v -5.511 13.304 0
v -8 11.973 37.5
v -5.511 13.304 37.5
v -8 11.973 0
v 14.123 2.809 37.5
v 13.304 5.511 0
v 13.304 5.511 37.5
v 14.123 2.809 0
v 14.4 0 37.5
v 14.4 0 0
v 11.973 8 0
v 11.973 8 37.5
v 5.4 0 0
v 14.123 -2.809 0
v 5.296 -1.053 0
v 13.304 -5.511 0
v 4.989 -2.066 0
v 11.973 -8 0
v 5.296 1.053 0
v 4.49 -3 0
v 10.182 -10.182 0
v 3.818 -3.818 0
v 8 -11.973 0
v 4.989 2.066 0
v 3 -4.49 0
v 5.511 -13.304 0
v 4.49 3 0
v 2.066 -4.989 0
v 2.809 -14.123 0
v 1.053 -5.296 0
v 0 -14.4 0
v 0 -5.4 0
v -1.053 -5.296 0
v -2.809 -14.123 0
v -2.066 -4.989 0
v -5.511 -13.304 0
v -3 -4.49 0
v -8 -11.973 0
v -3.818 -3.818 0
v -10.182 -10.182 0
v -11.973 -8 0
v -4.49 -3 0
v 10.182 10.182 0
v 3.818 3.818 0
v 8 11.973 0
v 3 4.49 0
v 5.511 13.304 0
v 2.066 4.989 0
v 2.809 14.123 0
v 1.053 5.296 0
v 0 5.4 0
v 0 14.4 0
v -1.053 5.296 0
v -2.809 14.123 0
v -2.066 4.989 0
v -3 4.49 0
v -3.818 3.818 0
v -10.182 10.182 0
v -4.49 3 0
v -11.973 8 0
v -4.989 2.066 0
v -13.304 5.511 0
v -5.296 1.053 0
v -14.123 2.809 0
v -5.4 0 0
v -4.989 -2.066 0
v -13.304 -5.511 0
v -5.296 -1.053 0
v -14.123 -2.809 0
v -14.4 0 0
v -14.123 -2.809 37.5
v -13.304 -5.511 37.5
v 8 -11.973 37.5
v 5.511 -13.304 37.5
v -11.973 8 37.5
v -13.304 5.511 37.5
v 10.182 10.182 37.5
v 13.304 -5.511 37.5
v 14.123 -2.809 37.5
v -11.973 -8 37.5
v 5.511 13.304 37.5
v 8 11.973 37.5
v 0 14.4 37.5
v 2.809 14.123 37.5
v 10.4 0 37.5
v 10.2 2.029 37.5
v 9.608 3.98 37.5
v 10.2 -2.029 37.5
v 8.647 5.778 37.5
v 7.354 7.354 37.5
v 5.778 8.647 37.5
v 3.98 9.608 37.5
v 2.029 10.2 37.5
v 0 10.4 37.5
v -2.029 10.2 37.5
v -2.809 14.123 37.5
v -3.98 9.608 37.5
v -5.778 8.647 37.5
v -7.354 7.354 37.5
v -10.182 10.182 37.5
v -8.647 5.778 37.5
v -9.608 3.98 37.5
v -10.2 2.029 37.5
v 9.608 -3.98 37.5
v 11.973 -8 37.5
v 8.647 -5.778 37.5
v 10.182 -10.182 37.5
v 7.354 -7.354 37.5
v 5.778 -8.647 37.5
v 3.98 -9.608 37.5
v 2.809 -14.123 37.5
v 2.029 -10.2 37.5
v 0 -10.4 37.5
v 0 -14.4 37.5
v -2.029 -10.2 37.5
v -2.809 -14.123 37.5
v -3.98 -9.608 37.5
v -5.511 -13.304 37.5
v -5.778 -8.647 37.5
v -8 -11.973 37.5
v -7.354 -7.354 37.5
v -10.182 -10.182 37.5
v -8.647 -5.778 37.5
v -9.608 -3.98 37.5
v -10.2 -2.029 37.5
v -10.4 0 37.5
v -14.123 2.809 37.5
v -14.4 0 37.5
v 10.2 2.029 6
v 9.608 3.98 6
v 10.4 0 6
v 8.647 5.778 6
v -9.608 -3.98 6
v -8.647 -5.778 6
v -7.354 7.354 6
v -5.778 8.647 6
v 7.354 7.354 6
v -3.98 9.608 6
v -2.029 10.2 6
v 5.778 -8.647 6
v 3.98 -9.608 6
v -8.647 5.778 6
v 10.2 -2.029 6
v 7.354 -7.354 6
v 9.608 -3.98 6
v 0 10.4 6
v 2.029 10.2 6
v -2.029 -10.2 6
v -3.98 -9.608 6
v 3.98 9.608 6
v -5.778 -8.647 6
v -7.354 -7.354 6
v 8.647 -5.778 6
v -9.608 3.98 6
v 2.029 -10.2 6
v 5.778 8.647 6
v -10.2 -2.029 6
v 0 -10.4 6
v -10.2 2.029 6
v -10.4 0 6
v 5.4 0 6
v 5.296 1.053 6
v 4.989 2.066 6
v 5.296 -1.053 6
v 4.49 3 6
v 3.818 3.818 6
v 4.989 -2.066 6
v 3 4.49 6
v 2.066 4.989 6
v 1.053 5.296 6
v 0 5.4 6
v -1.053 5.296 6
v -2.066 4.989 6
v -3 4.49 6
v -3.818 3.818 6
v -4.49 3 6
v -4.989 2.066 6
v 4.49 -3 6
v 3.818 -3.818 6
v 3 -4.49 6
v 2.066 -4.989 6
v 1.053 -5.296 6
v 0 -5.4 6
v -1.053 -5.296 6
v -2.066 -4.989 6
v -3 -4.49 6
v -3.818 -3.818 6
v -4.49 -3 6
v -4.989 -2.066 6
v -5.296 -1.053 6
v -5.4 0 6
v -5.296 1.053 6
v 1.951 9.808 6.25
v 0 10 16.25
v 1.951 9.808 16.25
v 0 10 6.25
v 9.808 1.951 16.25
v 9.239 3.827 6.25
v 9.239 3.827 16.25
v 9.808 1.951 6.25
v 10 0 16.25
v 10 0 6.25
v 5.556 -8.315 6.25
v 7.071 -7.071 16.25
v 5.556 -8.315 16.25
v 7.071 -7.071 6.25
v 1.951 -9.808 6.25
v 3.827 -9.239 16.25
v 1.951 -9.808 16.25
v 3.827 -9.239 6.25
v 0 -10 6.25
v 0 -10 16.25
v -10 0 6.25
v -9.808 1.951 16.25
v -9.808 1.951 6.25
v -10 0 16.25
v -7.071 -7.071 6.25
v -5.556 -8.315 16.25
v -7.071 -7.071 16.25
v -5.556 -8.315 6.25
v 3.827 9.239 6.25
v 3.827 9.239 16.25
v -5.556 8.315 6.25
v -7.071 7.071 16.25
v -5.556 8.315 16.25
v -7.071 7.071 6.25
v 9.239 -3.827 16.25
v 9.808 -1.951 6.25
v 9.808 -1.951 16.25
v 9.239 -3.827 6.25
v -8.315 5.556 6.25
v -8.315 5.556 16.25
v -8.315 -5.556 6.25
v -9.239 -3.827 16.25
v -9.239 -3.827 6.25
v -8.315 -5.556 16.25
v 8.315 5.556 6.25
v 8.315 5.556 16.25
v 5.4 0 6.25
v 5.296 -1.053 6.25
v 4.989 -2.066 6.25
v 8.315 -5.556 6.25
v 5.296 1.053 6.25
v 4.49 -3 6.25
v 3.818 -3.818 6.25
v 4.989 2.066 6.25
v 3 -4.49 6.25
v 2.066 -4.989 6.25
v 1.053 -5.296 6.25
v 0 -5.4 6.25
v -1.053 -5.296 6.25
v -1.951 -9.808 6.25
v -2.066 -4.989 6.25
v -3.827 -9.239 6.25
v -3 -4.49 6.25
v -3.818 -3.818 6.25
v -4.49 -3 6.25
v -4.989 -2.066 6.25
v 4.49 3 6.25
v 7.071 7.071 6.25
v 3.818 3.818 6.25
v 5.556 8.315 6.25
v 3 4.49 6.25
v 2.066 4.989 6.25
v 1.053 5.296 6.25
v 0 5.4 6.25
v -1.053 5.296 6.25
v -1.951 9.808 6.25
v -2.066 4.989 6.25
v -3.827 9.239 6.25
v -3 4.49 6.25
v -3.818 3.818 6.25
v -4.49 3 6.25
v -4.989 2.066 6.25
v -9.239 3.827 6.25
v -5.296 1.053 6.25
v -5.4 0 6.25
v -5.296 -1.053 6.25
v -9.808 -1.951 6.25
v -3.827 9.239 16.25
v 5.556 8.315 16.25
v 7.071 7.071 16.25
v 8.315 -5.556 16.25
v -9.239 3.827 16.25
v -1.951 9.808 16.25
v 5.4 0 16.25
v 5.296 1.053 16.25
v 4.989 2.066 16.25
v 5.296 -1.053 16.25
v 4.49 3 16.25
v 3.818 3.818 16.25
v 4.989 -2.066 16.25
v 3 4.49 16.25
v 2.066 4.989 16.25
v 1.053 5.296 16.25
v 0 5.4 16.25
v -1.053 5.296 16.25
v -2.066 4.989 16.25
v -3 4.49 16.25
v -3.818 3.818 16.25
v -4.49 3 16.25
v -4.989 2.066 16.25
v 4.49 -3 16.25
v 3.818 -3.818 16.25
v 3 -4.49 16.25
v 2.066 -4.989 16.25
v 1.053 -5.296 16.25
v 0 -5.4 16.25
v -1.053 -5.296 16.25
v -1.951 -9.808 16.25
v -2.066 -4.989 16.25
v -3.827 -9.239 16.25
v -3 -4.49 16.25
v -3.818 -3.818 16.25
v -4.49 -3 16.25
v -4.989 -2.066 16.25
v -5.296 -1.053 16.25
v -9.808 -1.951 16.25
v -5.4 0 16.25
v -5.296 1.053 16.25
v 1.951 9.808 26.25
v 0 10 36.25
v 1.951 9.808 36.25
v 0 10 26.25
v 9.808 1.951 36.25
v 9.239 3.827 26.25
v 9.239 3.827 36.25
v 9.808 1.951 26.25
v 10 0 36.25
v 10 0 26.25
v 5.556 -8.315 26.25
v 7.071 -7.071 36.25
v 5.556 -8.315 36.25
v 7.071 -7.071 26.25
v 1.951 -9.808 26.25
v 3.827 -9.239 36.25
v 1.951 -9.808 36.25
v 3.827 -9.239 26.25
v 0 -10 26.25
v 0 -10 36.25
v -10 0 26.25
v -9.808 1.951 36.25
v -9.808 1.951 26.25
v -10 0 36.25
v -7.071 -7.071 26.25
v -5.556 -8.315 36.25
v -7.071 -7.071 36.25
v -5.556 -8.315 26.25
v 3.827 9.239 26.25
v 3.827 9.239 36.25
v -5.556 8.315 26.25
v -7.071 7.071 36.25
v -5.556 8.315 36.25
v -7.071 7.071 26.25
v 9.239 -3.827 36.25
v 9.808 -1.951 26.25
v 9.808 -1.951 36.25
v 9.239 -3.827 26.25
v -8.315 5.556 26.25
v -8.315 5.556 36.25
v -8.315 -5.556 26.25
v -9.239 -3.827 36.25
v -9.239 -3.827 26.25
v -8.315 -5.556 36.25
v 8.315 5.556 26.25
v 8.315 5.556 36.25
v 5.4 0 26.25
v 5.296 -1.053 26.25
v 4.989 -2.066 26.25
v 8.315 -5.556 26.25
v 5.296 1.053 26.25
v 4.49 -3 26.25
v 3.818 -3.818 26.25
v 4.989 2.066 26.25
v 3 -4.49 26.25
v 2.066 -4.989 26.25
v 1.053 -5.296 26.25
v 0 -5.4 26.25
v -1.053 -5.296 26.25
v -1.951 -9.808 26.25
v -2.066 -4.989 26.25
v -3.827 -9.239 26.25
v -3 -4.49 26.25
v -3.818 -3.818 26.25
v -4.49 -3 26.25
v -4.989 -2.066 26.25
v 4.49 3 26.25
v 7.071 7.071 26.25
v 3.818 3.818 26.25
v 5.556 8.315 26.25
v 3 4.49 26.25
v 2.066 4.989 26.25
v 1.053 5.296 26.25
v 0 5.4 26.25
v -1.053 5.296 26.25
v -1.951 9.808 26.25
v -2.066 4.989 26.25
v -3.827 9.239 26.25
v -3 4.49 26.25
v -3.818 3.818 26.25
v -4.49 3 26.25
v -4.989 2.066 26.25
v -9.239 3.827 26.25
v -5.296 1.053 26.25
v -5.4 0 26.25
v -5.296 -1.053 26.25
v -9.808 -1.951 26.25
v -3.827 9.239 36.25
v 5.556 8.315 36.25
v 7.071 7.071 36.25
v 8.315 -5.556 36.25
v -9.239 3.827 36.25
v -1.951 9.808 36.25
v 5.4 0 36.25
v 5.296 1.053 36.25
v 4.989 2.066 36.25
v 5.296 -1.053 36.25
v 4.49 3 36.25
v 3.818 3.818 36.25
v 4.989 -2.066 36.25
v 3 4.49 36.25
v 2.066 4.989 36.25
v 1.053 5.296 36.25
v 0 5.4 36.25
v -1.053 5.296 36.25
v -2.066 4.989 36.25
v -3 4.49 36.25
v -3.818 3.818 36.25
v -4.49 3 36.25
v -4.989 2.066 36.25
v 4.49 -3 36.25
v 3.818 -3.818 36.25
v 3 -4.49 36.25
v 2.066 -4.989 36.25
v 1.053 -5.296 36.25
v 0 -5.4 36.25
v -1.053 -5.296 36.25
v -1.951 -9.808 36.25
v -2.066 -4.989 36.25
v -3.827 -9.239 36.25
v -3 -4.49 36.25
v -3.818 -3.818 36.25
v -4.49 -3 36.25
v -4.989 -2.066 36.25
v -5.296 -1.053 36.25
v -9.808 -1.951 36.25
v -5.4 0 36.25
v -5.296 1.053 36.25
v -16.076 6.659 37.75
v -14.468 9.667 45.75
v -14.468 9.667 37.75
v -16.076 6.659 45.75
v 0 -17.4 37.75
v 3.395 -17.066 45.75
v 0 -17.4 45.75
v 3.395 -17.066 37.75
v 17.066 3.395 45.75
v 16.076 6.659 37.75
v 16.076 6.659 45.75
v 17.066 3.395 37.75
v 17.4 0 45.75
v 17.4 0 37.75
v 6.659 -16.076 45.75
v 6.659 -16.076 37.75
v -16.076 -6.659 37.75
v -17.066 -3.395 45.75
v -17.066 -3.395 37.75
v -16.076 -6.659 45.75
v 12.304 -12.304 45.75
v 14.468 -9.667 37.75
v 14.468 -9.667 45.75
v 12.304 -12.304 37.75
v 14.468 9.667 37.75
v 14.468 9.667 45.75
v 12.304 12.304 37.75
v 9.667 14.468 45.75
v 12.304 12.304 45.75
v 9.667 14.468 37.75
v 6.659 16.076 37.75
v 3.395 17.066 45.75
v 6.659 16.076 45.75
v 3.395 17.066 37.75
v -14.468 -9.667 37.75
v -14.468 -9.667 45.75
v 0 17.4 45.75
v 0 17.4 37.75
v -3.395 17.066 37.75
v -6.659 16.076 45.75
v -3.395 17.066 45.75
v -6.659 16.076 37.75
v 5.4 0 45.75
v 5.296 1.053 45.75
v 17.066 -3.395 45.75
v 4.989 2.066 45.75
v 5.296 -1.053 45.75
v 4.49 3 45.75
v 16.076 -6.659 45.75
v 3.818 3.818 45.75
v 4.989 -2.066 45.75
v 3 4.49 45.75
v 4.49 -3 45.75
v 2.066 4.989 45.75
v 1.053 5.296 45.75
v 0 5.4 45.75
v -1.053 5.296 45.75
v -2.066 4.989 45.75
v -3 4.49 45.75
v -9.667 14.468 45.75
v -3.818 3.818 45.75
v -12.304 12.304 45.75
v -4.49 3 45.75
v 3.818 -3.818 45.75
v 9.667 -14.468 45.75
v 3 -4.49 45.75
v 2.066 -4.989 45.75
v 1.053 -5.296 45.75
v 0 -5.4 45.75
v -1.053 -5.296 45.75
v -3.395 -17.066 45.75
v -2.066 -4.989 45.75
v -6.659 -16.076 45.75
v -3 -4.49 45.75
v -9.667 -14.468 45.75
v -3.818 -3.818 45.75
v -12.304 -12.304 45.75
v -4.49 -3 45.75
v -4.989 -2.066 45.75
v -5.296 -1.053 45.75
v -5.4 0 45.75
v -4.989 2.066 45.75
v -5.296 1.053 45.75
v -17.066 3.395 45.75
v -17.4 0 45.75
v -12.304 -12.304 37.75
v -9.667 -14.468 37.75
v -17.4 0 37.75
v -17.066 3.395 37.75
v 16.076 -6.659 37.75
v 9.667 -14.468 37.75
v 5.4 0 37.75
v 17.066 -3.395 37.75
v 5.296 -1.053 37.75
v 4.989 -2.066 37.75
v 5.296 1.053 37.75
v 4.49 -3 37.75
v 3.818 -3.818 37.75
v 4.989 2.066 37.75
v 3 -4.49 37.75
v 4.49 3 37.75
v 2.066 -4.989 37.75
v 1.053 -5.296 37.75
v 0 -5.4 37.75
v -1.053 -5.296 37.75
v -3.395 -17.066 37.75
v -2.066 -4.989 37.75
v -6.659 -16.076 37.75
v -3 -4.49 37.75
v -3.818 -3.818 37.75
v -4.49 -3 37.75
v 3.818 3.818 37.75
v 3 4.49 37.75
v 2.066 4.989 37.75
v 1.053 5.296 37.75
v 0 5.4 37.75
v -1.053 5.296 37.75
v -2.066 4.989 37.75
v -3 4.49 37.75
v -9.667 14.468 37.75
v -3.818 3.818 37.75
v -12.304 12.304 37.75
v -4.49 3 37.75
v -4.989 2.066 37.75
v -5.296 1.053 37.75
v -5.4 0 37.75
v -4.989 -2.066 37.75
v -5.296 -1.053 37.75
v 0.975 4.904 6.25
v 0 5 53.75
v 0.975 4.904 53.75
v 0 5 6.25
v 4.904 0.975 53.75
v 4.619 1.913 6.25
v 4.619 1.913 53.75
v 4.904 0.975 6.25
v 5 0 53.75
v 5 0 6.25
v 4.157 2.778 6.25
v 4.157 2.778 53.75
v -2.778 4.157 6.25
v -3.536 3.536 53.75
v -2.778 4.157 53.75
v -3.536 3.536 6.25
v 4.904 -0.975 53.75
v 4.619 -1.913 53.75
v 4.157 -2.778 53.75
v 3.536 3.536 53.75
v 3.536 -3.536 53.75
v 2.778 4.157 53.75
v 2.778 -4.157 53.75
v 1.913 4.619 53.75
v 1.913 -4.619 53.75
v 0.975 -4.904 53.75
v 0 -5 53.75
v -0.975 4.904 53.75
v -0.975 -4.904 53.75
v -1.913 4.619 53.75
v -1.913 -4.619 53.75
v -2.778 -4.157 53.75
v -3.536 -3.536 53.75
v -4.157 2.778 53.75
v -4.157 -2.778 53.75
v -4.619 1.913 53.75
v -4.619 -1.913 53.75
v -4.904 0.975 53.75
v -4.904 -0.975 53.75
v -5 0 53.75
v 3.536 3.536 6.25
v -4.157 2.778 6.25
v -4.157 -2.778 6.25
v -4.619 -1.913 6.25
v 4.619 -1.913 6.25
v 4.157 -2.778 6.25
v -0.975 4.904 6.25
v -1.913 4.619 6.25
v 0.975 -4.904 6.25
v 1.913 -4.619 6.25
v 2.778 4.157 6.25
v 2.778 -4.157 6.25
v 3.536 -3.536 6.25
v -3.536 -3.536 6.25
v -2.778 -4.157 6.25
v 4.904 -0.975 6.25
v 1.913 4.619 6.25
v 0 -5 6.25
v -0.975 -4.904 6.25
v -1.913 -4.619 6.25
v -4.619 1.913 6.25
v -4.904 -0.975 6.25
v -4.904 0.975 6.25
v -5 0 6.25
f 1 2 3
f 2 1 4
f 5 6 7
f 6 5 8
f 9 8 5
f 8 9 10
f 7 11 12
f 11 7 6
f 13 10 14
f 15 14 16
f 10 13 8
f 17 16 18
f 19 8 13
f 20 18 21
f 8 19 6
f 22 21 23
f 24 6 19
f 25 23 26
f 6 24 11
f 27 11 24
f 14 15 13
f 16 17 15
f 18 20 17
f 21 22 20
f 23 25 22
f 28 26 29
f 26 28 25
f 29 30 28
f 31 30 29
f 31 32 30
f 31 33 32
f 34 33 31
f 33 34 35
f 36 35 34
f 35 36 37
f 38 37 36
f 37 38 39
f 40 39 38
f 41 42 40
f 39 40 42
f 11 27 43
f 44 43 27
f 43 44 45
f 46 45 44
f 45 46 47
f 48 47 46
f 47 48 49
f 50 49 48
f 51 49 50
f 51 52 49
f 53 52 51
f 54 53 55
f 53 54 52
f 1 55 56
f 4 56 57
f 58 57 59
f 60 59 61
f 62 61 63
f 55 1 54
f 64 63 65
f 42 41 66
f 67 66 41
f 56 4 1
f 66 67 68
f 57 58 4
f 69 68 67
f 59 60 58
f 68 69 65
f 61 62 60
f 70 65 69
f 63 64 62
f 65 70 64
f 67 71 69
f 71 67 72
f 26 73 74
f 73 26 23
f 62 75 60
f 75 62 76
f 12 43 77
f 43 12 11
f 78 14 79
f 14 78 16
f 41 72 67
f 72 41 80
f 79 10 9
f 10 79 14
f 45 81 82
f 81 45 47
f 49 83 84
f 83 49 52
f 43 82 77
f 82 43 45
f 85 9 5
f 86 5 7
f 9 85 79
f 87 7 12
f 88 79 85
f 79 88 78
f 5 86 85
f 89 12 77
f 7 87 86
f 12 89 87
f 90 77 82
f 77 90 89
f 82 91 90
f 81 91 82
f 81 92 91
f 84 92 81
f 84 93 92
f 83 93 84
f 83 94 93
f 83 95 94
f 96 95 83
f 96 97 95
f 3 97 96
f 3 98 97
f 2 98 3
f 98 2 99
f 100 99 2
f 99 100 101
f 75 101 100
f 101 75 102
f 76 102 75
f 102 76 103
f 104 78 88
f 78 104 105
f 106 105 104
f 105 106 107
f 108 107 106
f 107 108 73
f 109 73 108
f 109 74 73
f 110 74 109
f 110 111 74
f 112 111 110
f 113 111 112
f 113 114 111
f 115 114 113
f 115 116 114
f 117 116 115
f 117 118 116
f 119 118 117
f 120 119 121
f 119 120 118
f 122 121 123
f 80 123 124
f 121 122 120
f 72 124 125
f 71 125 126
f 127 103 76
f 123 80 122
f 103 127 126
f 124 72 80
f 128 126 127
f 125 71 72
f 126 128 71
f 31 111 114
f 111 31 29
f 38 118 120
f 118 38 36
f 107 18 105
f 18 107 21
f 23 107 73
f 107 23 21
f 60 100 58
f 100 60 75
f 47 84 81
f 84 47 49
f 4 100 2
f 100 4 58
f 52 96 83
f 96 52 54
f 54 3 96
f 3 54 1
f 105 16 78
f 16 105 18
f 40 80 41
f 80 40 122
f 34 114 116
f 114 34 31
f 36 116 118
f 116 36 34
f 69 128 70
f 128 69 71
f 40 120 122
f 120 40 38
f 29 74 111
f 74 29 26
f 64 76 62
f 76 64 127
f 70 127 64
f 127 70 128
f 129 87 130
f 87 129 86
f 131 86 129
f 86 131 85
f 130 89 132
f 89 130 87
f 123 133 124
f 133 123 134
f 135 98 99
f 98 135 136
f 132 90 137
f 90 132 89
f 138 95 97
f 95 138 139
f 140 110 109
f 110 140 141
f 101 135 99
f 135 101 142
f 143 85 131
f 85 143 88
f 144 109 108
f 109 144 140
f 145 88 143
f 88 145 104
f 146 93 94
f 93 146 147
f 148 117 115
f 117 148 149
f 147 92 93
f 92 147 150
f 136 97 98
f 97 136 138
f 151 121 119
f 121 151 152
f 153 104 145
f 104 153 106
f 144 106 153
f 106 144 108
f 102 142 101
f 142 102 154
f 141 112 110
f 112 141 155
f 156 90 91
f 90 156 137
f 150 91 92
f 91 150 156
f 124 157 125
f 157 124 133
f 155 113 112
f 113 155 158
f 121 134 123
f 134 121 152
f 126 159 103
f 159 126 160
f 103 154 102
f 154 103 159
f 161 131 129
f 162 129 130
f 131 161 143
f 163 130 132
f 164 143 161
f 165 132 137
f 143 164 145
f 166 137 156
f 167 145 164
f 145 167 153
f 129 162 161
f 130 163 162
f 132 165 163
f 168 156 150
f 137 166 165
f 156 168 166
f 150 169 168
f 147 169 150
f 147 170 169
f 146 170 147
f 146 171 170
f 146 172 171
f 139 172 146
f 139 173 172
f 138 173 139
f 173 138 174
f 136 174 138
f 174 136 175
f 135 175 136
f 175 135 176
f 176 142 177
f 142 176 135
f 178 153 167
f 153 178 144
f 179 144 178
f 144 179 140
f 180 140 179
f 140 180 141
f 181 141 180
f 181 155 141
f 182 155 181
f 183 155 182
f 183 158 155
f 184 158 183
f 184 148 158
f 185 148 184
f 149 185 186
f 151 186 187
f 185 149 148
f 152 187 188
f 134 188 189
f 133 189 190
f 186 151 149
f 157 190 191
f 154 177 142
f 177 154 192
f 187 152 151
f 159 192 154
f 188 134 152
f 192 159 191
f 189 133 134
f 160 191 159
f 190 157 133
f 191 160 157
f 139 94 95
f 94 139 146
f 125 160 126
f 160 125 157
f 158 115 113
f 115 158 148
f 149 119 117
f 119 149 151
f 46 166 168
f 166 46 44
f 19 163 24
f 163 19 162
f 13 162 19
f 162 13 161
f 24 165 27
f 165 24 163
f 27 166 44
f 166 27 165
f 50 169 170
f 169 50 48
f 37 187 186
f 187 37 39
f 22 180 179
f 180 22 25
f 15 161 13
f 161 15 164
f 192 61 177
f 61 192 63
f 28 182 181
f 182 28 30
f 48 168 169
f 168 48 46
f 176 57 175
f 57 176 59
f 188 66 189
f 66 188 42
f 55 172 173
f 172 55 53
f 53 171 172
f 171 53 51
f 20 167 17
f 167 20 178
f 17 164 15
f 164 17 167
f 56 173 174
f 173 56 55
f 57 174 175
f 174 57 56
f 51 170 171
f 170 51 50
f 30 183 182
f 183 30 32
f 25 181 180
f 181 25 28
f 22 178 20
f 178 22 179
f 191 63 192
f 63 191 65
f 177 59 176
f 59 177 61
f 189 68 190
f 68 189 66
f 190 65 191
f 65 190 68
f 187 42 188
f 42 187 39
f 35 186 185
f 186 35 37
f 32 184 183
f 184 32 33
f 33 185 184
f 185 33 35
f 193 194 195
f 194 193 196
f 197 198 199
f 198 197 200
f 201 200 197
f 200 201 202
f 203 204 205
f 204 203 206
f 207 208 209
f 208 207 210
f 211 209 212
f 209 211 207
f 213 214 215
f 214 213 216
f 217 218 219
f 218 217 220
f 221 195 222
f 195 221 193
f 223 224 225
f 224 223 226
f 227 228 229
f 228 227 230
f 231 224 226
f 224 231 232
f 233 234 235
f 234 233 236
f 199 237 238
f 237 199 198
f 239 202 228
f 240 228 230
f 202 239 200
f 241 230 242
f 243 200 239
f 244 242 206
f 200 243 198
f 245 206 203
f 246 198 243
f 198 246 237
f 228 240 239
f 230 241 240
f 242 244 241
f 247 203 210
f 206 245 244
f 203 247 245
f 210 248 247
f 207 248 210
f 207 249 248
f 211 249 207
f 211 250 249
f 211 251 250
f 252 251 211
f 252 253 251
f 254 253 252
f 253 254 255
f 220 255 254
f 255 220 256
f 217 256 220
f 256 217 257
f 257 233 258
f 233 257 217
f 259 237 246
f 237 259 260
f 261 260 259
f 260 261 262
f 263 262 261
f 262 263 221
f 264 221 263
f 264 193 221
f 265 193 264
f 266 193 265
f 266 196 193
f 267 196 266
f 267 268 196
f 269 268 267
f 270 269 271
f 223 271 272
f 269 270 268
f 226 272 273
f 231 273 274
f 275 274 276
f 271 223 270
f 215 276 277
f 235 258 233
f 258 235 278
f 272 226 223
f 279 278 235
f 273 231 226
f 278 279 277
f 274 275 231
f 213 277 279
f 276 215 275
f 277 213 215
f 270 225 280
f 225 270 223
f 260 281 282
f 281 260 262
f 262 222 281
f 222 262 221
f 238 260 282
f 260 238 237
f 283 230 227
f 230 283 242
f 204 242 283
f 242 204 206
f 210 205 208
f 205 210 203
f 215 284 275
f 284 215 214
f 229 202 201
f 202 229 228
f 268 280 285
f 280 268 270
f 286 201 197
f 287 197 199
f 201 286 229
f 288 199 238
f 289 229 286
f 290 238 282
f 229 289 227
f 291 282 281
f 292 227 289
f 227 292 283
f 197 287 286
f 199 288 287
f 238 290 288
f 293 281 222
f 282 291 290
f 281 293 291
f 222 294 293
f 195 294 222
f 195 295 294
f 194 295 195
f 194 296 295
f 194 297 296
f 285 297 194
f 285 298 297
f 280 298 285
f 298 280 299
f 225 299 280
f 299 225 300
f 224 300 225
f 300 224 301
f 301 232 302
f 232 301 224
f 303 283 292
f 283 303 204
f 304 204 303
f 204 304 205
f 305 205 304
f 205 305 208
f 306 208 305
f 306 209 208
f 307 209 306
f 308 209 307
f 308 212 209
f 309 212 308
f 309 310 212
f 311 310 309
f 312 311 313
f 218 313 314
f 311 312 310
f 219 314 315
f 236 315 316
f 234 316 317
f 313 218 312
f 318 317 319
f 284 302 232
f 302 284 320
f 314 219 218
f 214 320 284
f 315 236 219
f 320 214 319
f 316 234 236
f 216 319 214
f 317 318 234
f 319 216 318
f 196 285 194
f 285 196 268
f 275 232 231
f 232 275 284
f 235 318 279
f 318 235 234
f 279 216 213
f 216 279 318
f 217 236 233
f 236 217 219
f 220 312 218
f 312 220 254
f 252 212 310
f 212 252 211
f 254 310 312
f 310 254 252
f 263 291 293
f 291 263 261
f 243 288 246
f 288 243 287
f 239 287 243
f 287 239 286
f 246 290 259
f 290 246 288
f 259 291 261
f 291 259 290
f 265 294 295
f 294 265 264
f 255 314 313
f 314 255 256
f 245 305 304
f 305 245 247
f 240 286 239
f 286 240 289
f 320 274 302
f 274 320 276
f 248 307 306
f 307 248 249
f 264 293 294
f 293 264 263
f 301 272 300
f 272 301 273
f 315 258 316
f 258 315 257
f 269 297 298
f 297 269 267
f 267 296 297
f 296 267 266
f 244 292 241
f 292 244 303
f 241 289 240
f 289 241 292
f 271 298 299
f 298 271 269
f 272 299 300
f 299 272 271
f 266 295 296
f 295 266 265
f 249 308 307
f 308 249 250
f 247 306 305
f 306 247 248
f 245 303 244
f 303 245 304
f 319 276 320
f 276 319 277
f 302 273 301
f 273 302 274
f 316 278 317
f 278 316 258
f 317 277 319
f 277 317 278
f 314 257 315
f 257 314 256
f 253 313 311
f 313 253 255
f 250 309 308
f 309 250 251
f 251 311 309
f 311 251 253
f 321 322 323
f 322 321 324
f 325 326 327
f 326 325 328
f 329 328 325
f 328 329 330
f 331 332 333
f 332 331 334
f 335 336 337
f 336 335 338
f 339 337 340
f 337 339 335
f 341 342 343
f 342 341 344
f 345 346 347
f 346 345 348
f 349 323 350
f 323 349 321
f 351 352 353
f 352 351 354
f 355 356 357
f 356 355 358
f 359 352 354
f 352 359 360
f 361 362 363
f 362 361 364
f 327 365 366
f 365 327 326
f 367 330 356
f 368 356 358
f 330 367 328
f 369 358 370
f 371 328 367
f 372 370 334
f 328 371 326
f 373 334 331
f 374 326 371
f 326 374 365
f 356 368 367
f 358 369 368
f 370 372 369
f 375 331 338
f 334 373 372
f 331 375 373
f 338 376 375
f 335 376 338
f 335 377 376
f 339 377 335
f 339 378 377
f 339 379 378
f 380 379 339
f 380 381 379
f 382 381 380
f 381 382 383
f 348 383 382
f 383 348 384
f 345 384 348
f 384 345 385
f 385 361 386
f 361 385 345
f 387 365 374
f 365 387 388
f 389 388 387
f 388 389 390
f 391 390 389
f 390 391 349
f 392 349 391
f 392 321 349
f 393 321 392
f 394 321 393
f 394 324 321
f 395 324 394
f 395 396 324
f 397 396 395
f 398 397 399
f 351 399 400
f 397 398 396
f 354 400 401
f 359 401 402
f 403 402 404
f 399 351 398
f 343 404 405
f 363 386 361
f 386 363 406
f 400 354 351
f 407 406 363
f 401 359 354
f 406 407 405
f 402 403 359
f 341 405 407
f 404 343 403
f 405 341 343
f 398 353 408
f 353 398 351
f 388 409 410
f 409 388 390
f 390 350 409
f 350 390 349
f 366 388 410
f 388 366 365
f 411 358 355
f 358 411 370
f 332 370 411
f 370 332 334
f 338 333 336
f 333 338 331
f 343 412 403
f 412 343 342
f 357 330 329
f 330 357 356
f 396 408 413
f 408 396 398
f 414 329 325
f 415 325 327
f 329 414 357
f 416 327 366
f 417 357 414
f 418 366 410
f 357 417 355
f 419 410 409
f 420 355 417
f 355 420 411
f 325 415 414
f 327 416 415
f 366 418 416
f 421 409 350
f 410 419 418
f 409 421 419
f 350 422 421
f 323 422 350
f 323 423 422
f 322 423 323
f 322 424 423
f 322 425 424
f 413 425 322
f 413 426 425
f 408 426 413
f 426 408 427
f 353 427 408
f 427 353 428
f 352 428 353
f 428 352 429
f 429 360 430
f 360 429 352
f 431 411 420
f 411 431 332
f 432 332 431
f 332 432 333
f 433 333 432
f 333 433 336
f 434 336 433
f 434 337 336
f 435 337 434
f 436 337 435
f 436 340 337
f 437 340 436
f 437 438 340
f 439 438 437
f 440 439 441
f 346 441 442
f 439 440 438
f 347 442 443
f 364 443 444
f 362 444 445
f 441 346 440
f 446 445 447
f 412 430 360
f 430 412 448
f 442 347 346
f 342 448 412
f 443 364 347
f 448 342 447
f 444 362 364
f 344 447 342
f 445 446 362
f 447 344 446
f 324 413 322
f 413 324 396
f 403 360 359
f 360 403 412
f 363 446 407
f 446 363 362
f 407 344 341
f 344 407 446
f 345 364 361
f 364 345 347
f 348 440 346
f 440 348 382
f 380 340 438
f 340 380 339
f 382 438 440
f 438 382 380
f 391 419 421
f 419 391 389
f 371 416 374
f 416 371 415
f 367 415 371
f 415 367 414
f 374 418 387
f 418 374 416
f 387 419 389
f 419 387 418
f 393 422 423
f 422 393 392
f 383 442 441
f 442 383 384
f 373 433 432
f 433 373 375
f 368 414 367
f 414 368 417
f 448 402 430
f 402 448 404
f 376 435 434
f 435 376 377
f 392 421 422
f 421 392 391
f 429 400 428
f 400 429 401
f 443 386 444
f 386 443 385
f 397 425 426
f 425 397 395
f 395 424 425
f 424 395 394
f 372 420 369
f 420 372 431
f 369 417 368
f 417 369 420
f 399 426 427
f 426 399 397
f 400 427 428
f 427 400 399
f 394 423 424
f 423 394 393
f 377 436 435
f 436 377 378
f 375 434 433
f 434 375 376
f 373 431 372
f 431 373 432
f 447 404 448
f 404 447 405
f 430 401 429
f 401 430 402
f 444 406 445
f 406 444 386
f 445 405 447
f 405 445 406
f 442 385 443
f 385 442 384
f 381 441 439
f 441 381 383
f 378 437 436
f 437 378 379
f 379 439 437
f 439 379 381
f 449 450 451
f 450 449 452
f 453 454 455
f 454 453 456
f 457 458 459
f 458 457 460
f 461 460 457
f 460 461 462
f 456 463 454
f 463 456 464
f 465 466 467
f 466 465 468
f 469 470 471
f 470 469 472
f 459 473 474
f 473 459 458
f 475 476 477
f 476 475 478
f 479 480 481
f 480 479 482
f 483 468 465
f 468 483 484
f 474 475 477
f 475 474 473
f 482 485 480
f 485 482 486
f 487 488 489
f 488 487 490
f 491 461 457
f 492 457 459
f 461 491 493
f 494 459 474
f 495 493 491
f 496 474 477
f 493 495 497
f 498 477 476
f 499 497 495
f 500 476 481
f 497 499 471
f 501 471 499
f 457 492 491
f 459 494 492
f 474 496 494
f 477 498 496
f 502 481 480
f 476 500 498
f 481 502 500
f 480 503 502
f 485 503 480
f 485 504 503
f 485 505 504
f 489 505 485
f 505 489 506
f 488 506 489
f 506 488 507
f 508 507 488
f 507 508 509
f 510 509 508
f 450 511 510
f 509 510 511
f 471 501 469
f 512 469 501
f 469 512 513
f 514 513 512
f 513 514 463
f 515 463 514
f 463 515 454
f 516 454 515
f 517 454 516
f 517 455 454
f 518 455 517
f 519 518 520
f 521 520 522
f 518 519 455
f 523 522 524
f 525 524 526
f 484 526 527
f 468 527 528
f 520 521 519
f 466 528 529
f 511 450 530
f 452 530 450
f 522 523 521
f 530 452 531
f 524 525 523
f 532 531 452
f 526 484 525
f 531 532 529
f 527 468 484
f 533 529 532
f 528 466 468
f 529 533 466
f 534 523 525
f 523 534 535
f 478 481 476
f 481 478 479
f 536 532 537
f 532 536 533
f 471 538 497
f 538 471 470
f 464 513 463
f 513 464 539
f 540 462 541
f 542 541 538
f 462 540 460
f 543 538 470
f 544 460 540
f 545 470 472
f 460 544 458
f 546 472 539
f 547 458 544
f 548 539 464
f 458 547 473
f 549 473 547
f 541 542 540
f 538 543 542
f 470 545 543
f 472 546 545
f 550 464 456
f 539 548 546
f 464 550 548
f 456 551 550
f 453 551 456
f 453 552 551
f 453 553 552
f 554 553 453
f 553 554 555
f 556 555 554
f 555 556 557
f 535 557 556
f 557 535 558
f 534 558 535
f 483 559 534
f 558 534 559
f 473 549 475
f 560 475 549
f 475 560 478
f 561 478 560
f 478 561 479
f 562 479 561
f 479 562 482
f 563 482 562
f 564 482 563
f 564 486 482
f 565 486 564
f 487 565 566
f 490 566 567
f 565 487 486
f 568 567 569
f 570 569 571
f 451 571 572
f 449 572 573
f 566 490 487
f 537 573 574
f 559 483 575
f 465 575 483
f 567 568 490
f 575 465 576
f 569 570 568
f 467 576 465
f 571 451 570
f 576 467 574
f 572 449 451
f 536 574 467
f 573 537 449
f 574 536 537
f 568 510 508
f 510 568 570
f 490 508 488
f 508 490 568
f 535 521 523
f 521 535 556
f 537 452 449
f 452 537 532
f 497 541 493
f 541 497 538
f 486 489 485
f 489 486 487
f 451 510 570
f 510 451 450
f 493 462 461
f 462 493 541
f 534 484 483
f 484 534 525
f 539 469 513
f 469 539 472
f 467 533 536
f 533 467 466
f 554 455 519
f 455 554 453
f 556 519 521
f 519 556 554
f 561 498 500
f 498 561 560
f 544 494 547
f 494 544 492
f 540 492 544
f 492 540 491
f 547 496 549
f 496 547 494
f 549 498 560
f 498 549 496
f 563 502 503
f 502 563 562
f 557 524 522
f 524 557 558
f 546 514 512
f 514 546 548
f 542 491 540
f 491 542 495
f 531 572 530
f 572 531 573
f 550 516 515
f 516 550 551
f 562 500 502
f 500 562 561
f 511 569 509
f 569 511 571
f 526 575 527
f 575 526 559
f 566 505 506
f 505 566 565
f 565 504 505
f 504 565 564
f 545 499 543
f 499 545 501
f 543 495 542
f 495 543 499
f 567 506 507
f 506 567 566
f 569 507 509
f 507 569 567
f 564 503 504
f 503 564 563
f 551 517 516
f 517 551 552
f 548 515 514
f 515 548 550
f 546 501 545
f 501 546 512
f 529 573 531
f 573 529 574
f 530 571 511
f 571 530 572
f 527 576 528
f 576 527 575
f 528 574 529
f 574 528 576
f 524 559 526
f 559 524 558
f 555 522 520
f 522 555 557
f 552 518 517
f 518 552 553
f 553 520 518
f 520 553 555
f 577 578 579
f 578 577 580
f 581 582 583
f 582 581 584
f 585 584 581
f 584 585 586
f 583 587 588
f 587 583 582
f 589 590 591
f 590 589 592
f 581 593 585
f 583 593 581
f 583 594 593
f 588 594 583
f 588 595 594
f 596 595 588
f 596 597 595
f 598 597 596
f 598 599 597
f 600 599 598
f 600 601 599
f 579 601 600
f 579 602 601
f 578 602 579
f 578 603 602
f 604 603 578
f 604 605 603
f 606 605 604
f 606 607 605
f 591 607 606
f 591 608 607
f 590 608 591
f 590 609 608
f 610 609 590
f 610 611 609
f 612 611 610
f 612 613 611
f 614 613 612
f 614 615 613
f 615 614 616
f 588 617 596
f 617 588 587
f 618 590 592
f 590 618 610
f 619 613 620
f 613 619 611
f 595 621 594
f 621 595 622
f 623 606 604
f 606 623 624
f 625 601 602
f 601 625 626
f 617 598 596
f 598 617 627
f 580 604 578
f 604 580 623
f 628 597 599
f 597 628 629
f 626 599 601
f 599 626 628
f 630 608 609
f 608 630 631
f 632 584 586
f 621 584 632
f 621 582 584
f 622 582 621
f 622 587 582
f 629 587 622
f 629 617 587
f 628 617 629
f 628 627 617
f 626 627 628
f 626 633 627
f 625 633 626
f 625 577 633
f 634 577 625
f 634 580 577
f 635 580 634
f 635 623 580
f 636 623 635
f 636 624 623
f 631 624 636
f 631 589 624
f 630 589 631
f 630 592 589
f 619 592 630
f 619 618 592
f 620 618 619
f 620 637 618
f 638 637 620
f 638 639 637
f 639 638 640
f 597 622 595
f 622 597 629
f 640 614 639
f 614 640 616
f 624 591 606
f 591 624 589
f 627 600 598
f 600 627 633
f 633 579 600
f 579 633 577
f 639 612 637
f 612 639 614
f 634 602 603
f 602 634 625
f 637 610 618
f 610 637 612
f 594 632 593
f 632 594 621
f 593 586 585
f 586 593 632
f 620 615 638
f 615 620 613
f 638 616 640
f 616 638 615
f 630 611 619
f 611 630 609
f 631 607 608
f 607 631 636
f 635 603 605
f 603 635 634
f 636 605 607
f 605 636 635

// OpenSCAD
$fn = 32;

// ------------------------------------------------------------------------
// Shaft station: cup d28.8 x 37.5 mm, shaft d10
// Every part is its own module, assembly() places every instance.
// ------------------------------------------------------------------------

// --- part 1 ---
module housing_cup() {
  difference() {
    cylinder(h = 37.5, d = 28.8);
    translate([0, 0, 6]) cylinder(h = 32.5, d = 20.8);
    translate([0, 0, -1]) cylinder(h = 8, d = 10.8);
  }
}

// --- part 2 ---
module bearing_lower() {
  difference() {
      translate([0, 0, 0]) cylinder(h = 10, d = 20);
      translate([0, 0, -1]) cylinder(h = 12, d = 10.8);
    }
}

// --- part 3 ---
module bearing_upper() {
  difference() {
      translate([0, 0, 0]) cylinder(h = 10, d = 20);
      translate([0, 0, -1]) cylinder(h = 12, d = 10.8);
    }
}

// --- part 4 ---
module station_shaft() {
  translate([0, 0, -23.75]) cylinder(h = 47.5, d = 10);
}

// --- part 5 ---
module station_cover() {
  difference() {
    cylinder(h = 8, d = 34.8);
    translate([0, 0, -1]) cylinder(h = 10, d = 10.8);
  }
}

// --- assembly ---
module assembly() {
  color([0.80, 0.24, 0.20]) translate([0, 0, 0]) rotate([0, 0, 0]) housing_cup();
  color([0.20, 0.45, 0.75]) translate([0, 0, 6.25]) rotate([0, 0, 0]) bearing_lower();
  color([0.25, 0.62, 0.32]) translate([0, 0, 26.25]) rotate([0, 0, 0]) bearing_upper();
  color([0.92, 0.70, 0.18]) translate([0, 0, 30]) rotate([0, 0, 0]) station_shaft();
  color([0.58, 0.35, 0.70]) translate([0, 0, 37.75]) rotate([0, 0, 0]) station_cover();
}

assembly();
